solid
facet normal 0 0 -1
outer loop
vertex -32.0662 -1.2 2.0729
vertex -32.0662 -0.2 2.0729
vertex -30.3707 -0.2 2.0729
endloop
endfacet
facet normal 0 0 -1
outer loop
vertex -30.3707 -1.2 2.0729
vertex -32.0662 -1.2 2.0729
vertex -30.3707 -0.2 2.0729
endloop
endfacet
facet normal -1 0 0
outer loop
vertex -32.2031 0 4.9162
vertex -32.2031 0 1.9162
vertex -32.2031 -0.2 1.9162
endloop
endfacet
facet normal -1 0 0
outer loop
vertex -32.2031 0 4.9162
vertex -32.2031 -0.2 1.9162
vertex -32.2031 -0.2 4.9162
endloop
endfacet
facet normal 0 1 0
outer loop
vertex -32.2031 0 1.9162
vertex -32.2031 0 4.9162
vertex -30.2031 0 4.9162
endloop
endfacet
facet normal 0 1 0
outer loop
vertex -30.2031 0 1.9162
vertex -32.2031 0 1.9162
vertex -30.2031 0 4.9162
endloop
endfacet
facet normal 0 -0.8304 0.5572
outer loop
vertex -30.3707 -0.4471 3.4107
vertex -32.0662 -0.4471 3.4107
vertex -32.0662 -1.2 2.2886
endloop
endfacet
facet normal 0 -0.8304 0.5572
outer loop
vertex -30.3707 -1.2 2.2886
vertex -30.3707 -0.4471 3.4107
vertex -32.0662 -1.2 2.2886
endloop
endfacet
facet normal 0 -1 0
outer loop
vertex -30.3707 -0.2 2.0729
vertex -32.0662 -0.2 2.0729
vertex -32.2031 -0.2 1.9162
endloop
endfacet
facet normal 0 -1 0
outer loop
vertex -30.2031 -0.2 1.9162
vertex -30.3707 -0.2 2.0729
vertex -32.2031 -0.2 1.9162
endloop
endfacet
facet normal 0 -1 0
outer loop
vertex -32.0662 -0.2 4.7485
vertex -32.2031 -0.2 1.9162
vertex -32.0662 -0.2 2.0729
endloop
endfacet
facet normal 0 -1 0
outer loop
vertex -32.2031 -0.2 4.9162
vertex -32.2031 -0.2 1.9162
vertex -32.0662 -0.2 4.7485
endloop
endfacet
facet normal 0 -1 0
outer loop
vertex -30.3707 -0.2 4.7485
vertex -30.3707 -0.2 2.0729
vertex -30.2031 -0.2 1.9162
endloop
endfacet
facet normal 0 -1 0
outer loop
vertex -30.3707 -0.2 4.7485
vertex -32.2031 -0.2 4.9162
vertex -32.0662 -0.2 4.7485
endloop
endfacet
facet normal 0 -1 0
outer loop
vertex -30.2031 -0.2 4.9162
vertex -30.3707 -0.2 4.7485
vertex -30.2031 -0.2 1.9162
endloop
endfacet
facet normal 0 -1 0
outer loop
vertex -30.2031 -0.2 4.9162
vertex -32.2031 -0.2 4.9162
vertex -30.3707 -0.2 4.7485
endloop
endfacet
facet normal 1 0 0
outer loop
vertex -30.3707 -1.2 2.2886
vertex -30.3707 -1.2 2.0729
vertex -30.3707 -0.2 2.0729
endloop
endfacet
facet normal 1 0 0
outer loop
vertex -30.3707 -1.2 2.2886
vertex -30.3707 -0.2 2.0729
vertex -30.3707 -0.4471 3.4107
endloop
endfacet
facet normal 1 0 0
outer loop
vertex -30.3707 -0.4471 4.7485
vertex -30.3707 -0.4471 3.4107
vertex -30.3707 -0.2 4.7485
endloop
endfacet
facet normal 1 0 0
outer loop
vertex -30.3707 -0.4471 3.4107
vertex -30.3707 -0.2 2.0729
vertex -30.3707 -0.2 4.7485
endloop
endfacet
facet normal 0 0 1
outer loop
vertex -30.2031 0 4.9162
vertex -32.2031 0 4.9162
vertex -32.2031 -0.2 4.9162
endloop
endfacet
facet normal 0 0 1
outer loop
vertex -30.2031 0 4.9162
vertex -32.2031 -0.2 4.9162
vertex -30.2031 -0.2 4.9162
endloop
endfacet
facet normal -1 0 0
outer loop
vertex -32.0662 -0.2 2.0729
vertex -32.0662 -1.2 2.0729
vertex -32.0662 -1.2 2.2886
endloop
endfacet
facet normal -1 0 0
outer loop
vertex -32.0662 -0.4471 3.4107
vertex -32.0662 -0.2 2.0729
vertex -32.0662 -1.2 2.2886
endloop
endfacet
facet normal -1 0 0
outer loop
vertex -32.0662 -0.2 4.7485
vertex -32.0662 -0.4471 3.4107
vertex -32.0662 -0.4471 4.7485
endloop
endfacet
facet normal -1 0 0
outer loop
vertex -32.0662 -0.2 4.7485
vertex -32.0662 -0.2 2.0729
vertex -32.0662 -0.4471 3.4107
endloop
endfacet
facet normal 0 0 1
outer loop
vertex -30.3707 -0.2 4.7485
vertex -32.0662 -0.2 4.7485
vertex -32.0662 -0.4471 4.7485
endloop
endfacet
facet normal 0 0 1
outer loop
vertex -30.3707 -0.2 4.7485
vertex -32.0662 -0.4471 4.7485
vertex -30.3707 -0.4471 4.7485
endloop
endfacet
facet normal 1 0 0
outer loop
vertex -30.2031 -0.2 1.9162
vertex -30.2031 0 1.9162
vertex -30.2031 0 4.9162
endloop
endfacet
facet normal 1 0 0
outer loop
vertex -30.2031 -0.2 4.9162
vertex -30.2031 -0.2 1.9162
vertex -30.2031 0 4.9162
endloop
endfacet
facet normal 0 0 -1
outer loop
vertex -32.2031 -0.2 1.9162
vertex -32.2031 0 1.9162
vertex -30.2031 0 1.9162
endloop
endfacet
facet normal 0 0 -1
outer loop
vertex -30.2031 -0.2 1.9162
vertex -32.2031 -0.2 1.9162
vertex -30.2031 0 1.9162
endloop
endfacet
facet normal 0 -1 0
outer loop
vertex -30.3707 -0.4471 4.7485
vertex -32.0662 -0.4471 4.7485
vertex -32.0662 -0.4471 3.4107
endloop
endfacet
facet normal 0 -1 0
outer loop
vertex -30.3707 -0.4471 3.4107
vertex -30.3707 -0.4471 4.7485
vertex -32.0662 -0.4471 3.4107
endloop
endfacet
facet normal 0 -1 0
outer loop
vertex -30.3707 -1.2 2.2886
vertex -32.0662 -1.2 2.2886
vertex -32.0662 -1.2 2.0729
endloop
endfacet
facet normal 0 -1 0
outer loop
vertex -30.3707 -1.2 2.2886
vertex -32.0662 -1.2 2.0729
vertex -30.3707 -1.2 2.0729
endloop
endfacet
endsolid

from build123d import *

# Parameters (mm, degrees)
SKETCH001_W  = 2
SKETCH001_H  = 3
PAD001_DEPTH = 0.2
SKETCH002_W  = 1.695532
SKETCH002_H  = 2.675653
PAD002_DEPTH = 1
POCKET_DEPTH = 5


with BuildPart() as part:
    # Sketch001 → Pad001 (new body)
    with BuildSketch(Plane.XZ):
        with Locations((-31.203119, 3.416212)):
            Rectangle(SKETCH001_W, SKETCH001_H)
    extrude(amount=PAD001_DEPTH)

    # Sketch002 (on Face6 of Pad001) → Pad002 (join)
    with BuildSketch(Plane.XZ.offset(0.2)):
        with Locations((-31.218465, 3.41068)):
            Rectangle(SKETCH002_W, SKETCH002_H)
    extrude(amount=PAD002_DEPTH)

    # Sketch003 (on Face10 of Pad002) → Pocket (cut)
    with BuildSketch(Plane(origin=(-32.066231, 0, 0), x_dir=(0, 0, -1), z_dir=(-1, 0, 0))):
        Polygon((-4.748507, 0.447133), (-3.410681, 0.447133), (-2.288648, 1.2), (-4.748507, 1.2), align=None)
    extrude(amount=-POCKET_DEPTH, mode=Mode.SUBTRACT)


solid = part.part
